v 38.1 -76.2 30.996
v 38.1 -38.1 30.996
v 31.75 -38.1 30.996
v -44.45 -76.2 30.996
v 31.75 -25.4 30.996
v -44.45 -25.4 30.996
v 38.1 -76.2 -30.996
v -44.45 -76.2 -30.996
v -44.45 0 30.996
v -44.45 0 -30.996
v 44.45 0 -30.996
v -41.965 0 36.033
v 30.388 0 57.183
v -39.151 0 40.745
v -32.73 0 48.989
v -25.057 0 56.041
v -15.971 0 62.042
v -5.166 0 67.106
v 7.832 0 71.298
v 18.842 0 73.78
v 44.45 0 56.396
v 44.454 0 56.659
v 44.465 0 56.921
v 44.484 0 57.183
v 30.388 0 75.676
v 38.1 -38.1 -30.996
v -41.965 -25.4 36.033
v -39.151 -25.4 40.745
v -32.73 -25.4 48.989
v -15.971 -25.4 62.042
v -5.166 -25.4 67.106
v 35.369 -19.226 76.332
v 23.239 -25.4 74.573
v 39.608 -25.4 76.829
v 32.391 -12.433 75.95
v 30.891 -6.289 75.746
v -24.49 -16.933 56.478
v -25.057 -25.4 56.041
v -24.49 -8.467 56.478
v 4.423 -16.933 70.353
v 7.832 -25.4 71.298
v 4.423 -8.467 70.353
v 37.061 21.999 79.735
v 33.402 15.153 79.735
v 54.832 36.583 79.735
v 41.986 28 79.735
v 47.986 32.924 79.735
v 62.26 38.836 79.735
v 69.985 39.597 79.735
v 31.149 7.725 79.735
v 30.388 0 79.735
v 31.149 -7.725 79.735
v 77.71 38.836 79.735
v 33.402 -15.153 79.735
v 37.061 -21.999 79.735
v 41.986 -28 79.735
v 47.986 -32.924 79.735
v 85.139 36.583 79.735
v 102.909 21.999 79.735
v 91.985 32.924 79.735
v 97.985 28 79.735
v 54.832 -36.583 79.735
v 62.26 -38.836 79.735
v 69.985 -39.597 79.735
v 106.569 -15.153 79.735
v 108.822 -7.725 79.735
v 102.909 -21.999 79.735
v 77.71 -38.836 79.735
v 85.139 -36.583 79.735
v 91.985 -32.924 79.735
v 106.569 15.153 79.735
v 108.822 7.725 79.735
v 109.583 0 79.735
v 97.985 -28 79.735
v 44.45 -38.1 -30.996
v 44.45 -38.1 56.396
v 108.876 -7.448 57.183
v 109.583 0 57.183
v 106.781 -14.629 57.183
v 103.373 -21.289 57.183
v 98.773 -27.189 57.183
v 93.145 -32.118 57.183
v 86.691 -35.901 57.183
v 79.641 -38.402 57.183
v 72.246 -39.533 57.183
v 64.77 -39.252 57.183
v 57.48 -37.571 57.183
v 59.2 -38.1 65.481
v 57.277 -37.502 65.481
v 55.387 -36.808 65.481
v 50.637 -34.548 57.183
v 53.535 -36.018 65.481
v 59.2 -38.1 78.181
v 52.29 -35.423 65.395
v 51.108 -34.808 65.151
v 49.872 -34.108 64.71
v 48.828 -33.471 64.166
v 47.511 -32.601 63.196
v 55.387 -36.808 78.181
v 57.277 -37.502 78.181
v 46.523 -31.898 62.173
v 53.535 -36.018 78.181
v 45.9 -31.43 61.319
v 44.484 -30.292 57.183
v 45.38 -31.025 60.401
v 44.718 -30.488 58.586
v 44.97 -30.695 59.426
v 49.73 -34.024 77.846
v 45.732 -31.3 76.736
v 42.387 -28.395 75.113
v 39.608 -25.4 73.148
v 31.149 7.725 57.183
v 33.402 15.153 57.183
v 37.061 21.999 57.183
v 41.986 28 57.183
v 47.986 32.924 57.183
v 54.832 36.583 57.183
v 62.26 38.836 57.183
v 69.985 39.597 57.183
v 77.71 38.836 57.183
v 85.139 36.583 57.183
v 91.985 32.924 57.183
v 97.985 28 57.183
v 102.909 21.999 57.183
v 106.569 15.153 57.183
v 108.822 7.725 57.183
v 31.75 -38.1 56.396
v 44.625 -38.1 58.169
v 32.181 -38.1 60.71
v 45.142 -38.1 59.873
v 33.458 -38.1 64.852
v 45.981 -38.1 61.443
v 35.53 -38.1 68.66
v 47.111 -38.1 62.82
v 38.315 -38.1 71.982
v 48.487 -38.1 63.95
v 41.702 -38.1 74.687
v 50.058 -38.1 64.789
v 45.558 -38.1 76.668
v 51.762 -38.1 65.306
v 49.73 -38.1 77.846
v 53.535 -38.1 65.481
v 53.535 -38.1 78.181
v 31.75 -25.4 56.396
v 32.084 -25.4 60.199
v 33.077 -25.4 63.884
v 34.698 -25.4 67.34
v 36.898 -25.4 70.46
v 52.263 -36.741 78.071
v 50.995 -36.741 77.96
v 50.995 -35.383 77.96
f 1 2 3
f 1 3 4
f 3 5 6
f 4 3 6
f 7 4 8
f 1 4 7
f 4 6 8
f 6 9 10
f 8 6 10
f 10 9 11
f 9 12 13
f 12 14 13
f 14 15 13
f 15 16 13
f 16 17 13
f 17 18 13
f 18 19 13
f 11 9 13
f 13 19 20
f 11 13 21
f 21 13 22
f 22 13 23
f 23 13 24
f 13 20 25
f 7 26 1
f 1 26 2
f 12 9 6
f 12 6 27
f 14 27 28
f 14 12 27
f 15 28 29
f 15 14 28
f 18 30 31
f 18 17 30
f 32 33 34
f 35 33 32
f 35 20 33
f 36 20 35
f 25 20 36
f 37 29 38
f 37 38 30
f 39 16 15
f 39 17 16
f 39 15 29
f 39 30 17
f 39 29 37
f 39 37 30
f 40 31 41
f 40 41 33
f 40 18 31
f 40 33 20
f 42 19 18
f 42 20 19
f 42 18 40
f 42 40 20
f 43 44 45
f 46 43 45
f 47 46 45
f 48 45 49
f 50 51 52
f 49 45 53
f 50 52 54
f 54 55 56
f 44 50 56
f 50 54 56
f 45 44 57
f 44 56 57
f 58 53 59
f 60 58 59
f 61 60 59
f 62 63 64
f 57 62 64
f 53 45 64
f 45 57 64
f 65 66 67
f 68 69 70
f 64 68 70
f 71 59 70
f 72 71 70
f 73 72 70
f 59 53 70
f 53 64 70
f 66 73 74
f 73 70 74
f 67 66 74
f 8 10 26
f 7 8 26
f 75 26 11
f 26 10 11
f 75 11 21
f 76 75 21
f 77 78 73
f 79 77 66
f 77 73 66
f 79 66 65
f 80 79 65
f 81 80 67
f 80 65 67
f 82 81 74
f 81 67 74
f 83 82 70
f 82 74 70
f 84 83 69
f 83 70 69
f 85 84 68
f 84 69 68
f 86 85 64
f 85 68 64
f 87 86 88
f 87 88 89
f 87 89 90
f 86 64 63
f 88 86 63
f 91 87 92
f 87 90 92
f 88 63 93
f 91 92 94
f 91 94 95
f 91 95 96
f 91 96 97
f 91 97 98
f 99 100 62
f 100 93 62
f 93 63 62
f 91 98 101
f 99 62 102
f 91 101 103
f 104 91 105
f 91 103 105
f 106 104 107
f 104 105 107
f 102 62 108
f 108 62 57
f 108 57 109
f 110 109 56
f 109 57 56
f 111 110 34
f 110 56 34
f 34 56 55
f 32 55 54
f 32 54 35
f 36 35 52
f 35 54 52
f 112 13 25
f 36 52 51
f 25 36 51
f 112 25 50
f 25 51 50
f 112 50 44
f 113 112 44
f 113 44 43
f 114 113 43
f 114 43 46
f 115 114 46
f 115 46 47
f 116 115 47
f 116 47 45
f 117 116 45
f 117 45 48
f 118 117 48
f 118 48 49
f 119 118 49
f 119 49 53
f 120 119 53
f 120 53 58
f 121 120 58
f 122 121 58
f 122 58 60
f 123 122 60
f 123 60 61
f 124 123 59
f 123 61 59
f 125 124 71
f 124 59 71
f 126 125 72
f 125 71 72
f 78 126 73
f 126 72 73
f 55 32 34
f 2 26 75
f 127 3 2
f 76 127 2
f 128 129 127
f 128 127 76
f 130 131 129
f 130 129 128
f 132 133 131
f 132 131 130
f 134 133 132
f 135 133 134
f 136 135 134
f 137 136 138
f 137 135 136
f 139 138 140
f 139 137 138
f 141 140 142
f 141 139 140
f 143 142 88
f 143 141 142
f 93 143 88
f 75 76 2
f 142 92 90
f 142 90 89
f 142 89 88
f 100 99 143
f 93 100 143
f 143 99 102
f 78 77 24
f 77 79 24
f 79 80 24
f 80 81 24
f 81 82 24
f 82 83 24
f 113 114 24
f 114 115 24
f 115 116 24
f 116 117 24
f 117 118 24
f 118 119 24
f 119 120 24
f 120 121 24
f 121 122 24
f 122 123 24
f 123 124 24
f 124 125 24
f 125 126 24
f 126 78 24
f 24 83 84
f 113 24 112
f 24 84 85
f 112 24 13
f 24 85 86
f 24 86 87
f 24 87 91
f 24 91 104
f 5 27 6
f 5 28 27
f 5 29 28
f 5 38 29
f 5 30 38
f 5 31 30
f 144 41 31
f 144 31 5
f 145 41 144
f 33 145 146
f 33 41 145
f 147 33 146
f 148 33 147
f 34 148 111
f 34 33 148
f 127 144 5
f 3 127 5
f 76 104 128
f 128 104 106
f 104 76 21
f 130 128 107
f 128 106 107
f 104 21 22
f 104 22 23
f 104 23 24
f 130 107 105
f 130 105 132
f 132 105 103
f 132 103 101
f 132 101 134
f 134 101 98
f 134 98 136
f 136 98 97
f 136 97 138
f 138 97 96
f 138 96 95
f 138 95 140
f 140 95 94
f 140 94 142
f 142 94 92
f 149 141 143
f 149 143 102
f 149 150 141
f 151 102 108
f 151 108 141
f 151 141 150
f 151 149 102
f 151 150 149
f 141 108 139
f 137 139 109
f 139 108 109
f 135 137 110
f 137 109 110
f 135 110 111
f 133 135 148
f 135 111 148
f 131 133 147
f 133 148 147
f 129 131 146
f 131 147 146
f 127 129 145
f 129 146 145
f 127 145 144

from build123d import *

# Parameters (mm, degrees)
F1_DEPTH = 76.2
F0_W     = 6.35
F0_H     = 61.992716
F2_DEPTH = 38.1
F3_DEPTH = 25.4


with BuildPart() as f1:
    # F0 (on Front) → F1 (new body)
    with BuildSketch(Plane.XZ):
        Polygon((38.1, -30.996358), (38.1, 30.996358), (31.75, 30.996358), (-44.45, 30.996358), (-44.45, -30.996358), align=None)
    extrude(amount=F1_DEPTH)

    # F0 (on Front) → F2 (join)
    with BuildSketch(Plane.XZ):
        with BuildLine():
            Line((38.1, 30.996358), (44.45, 30.996358))
            Line((44.45, 30.996358), (44.45, 56.396358))
            ThreePointArc((44.45, 56.396358), (47.110789, 62.82007), (53.534501, 65.480859))
            Line((53.534501, 65.480859), (69.985434, 65.480859))
            Line((69.985434, 65.480859), (69.985434, 78.180859))
            Line((69.985434, 78.180859), (53.534501, 78.180859))
            add(Edge.make_bspline(
                [(49.729503, 77.845984), (50.993288, 77.960759), (52.261766, 78.072157), (53.534501, 78.180859)],
                knots=[105.554558, 105.554558, 105.554558, 105.554558, 108.753573, 108.753573, 108.753573, 108.753573], degree=3))
            ThreePointArc((49.729503, 77.845984), (36.839375, 70.390544), (31.75, 56.396358))
            Line((31.75, 56.396358), (31.75, 30.996358))
            Line((31.75, 30.996358), (38.1, 30.996358))
        make_face()
        with Locations((41.275, 0)):
            Rectangle(F0_W, F0_H)
    extrude(amount=F2_DEPTH)

    # F0 (on Front) → F3 (join)
    with BuildSketch(Plane.XZ):
        with BuildLine():
            Line((-44.45, 30.996358), (31.75, 30.996358))
            Line((31.75, 30.996358), (31.75, 56.396358))
            ThreePointArc((31.75, 56.396358), (36.839375, 70.390544), (49.729503, 77.845984))
            add(Edge.make_bspline(
                [(-44.45, 30.996358), (-28.561943, 66.594918), (8.029683, 74.058869), (49.729503, 77.845984)],
                knots=[0, 0, 0, 0, 105.554558, 105.554558, 105.554558, 105.554558], degree=3))
        make_face()
    extrude(amount=F3_DEPTH)

    # F0 (on Front) → F4 (revolve)
    with BuildSketch(Plane.XZ):
        Polygon((69.985434, 78.180859), (69.985434, 65.480859), (69.985434, 57.183055), (109.582732, 57.183055), (109.582732, 79.735152), (69.985434, 79.735152), align=None)
    revolve(axis=Axis((69.985434, 0, 68.459103), (0, 0, -1)))


solid = f1.part
